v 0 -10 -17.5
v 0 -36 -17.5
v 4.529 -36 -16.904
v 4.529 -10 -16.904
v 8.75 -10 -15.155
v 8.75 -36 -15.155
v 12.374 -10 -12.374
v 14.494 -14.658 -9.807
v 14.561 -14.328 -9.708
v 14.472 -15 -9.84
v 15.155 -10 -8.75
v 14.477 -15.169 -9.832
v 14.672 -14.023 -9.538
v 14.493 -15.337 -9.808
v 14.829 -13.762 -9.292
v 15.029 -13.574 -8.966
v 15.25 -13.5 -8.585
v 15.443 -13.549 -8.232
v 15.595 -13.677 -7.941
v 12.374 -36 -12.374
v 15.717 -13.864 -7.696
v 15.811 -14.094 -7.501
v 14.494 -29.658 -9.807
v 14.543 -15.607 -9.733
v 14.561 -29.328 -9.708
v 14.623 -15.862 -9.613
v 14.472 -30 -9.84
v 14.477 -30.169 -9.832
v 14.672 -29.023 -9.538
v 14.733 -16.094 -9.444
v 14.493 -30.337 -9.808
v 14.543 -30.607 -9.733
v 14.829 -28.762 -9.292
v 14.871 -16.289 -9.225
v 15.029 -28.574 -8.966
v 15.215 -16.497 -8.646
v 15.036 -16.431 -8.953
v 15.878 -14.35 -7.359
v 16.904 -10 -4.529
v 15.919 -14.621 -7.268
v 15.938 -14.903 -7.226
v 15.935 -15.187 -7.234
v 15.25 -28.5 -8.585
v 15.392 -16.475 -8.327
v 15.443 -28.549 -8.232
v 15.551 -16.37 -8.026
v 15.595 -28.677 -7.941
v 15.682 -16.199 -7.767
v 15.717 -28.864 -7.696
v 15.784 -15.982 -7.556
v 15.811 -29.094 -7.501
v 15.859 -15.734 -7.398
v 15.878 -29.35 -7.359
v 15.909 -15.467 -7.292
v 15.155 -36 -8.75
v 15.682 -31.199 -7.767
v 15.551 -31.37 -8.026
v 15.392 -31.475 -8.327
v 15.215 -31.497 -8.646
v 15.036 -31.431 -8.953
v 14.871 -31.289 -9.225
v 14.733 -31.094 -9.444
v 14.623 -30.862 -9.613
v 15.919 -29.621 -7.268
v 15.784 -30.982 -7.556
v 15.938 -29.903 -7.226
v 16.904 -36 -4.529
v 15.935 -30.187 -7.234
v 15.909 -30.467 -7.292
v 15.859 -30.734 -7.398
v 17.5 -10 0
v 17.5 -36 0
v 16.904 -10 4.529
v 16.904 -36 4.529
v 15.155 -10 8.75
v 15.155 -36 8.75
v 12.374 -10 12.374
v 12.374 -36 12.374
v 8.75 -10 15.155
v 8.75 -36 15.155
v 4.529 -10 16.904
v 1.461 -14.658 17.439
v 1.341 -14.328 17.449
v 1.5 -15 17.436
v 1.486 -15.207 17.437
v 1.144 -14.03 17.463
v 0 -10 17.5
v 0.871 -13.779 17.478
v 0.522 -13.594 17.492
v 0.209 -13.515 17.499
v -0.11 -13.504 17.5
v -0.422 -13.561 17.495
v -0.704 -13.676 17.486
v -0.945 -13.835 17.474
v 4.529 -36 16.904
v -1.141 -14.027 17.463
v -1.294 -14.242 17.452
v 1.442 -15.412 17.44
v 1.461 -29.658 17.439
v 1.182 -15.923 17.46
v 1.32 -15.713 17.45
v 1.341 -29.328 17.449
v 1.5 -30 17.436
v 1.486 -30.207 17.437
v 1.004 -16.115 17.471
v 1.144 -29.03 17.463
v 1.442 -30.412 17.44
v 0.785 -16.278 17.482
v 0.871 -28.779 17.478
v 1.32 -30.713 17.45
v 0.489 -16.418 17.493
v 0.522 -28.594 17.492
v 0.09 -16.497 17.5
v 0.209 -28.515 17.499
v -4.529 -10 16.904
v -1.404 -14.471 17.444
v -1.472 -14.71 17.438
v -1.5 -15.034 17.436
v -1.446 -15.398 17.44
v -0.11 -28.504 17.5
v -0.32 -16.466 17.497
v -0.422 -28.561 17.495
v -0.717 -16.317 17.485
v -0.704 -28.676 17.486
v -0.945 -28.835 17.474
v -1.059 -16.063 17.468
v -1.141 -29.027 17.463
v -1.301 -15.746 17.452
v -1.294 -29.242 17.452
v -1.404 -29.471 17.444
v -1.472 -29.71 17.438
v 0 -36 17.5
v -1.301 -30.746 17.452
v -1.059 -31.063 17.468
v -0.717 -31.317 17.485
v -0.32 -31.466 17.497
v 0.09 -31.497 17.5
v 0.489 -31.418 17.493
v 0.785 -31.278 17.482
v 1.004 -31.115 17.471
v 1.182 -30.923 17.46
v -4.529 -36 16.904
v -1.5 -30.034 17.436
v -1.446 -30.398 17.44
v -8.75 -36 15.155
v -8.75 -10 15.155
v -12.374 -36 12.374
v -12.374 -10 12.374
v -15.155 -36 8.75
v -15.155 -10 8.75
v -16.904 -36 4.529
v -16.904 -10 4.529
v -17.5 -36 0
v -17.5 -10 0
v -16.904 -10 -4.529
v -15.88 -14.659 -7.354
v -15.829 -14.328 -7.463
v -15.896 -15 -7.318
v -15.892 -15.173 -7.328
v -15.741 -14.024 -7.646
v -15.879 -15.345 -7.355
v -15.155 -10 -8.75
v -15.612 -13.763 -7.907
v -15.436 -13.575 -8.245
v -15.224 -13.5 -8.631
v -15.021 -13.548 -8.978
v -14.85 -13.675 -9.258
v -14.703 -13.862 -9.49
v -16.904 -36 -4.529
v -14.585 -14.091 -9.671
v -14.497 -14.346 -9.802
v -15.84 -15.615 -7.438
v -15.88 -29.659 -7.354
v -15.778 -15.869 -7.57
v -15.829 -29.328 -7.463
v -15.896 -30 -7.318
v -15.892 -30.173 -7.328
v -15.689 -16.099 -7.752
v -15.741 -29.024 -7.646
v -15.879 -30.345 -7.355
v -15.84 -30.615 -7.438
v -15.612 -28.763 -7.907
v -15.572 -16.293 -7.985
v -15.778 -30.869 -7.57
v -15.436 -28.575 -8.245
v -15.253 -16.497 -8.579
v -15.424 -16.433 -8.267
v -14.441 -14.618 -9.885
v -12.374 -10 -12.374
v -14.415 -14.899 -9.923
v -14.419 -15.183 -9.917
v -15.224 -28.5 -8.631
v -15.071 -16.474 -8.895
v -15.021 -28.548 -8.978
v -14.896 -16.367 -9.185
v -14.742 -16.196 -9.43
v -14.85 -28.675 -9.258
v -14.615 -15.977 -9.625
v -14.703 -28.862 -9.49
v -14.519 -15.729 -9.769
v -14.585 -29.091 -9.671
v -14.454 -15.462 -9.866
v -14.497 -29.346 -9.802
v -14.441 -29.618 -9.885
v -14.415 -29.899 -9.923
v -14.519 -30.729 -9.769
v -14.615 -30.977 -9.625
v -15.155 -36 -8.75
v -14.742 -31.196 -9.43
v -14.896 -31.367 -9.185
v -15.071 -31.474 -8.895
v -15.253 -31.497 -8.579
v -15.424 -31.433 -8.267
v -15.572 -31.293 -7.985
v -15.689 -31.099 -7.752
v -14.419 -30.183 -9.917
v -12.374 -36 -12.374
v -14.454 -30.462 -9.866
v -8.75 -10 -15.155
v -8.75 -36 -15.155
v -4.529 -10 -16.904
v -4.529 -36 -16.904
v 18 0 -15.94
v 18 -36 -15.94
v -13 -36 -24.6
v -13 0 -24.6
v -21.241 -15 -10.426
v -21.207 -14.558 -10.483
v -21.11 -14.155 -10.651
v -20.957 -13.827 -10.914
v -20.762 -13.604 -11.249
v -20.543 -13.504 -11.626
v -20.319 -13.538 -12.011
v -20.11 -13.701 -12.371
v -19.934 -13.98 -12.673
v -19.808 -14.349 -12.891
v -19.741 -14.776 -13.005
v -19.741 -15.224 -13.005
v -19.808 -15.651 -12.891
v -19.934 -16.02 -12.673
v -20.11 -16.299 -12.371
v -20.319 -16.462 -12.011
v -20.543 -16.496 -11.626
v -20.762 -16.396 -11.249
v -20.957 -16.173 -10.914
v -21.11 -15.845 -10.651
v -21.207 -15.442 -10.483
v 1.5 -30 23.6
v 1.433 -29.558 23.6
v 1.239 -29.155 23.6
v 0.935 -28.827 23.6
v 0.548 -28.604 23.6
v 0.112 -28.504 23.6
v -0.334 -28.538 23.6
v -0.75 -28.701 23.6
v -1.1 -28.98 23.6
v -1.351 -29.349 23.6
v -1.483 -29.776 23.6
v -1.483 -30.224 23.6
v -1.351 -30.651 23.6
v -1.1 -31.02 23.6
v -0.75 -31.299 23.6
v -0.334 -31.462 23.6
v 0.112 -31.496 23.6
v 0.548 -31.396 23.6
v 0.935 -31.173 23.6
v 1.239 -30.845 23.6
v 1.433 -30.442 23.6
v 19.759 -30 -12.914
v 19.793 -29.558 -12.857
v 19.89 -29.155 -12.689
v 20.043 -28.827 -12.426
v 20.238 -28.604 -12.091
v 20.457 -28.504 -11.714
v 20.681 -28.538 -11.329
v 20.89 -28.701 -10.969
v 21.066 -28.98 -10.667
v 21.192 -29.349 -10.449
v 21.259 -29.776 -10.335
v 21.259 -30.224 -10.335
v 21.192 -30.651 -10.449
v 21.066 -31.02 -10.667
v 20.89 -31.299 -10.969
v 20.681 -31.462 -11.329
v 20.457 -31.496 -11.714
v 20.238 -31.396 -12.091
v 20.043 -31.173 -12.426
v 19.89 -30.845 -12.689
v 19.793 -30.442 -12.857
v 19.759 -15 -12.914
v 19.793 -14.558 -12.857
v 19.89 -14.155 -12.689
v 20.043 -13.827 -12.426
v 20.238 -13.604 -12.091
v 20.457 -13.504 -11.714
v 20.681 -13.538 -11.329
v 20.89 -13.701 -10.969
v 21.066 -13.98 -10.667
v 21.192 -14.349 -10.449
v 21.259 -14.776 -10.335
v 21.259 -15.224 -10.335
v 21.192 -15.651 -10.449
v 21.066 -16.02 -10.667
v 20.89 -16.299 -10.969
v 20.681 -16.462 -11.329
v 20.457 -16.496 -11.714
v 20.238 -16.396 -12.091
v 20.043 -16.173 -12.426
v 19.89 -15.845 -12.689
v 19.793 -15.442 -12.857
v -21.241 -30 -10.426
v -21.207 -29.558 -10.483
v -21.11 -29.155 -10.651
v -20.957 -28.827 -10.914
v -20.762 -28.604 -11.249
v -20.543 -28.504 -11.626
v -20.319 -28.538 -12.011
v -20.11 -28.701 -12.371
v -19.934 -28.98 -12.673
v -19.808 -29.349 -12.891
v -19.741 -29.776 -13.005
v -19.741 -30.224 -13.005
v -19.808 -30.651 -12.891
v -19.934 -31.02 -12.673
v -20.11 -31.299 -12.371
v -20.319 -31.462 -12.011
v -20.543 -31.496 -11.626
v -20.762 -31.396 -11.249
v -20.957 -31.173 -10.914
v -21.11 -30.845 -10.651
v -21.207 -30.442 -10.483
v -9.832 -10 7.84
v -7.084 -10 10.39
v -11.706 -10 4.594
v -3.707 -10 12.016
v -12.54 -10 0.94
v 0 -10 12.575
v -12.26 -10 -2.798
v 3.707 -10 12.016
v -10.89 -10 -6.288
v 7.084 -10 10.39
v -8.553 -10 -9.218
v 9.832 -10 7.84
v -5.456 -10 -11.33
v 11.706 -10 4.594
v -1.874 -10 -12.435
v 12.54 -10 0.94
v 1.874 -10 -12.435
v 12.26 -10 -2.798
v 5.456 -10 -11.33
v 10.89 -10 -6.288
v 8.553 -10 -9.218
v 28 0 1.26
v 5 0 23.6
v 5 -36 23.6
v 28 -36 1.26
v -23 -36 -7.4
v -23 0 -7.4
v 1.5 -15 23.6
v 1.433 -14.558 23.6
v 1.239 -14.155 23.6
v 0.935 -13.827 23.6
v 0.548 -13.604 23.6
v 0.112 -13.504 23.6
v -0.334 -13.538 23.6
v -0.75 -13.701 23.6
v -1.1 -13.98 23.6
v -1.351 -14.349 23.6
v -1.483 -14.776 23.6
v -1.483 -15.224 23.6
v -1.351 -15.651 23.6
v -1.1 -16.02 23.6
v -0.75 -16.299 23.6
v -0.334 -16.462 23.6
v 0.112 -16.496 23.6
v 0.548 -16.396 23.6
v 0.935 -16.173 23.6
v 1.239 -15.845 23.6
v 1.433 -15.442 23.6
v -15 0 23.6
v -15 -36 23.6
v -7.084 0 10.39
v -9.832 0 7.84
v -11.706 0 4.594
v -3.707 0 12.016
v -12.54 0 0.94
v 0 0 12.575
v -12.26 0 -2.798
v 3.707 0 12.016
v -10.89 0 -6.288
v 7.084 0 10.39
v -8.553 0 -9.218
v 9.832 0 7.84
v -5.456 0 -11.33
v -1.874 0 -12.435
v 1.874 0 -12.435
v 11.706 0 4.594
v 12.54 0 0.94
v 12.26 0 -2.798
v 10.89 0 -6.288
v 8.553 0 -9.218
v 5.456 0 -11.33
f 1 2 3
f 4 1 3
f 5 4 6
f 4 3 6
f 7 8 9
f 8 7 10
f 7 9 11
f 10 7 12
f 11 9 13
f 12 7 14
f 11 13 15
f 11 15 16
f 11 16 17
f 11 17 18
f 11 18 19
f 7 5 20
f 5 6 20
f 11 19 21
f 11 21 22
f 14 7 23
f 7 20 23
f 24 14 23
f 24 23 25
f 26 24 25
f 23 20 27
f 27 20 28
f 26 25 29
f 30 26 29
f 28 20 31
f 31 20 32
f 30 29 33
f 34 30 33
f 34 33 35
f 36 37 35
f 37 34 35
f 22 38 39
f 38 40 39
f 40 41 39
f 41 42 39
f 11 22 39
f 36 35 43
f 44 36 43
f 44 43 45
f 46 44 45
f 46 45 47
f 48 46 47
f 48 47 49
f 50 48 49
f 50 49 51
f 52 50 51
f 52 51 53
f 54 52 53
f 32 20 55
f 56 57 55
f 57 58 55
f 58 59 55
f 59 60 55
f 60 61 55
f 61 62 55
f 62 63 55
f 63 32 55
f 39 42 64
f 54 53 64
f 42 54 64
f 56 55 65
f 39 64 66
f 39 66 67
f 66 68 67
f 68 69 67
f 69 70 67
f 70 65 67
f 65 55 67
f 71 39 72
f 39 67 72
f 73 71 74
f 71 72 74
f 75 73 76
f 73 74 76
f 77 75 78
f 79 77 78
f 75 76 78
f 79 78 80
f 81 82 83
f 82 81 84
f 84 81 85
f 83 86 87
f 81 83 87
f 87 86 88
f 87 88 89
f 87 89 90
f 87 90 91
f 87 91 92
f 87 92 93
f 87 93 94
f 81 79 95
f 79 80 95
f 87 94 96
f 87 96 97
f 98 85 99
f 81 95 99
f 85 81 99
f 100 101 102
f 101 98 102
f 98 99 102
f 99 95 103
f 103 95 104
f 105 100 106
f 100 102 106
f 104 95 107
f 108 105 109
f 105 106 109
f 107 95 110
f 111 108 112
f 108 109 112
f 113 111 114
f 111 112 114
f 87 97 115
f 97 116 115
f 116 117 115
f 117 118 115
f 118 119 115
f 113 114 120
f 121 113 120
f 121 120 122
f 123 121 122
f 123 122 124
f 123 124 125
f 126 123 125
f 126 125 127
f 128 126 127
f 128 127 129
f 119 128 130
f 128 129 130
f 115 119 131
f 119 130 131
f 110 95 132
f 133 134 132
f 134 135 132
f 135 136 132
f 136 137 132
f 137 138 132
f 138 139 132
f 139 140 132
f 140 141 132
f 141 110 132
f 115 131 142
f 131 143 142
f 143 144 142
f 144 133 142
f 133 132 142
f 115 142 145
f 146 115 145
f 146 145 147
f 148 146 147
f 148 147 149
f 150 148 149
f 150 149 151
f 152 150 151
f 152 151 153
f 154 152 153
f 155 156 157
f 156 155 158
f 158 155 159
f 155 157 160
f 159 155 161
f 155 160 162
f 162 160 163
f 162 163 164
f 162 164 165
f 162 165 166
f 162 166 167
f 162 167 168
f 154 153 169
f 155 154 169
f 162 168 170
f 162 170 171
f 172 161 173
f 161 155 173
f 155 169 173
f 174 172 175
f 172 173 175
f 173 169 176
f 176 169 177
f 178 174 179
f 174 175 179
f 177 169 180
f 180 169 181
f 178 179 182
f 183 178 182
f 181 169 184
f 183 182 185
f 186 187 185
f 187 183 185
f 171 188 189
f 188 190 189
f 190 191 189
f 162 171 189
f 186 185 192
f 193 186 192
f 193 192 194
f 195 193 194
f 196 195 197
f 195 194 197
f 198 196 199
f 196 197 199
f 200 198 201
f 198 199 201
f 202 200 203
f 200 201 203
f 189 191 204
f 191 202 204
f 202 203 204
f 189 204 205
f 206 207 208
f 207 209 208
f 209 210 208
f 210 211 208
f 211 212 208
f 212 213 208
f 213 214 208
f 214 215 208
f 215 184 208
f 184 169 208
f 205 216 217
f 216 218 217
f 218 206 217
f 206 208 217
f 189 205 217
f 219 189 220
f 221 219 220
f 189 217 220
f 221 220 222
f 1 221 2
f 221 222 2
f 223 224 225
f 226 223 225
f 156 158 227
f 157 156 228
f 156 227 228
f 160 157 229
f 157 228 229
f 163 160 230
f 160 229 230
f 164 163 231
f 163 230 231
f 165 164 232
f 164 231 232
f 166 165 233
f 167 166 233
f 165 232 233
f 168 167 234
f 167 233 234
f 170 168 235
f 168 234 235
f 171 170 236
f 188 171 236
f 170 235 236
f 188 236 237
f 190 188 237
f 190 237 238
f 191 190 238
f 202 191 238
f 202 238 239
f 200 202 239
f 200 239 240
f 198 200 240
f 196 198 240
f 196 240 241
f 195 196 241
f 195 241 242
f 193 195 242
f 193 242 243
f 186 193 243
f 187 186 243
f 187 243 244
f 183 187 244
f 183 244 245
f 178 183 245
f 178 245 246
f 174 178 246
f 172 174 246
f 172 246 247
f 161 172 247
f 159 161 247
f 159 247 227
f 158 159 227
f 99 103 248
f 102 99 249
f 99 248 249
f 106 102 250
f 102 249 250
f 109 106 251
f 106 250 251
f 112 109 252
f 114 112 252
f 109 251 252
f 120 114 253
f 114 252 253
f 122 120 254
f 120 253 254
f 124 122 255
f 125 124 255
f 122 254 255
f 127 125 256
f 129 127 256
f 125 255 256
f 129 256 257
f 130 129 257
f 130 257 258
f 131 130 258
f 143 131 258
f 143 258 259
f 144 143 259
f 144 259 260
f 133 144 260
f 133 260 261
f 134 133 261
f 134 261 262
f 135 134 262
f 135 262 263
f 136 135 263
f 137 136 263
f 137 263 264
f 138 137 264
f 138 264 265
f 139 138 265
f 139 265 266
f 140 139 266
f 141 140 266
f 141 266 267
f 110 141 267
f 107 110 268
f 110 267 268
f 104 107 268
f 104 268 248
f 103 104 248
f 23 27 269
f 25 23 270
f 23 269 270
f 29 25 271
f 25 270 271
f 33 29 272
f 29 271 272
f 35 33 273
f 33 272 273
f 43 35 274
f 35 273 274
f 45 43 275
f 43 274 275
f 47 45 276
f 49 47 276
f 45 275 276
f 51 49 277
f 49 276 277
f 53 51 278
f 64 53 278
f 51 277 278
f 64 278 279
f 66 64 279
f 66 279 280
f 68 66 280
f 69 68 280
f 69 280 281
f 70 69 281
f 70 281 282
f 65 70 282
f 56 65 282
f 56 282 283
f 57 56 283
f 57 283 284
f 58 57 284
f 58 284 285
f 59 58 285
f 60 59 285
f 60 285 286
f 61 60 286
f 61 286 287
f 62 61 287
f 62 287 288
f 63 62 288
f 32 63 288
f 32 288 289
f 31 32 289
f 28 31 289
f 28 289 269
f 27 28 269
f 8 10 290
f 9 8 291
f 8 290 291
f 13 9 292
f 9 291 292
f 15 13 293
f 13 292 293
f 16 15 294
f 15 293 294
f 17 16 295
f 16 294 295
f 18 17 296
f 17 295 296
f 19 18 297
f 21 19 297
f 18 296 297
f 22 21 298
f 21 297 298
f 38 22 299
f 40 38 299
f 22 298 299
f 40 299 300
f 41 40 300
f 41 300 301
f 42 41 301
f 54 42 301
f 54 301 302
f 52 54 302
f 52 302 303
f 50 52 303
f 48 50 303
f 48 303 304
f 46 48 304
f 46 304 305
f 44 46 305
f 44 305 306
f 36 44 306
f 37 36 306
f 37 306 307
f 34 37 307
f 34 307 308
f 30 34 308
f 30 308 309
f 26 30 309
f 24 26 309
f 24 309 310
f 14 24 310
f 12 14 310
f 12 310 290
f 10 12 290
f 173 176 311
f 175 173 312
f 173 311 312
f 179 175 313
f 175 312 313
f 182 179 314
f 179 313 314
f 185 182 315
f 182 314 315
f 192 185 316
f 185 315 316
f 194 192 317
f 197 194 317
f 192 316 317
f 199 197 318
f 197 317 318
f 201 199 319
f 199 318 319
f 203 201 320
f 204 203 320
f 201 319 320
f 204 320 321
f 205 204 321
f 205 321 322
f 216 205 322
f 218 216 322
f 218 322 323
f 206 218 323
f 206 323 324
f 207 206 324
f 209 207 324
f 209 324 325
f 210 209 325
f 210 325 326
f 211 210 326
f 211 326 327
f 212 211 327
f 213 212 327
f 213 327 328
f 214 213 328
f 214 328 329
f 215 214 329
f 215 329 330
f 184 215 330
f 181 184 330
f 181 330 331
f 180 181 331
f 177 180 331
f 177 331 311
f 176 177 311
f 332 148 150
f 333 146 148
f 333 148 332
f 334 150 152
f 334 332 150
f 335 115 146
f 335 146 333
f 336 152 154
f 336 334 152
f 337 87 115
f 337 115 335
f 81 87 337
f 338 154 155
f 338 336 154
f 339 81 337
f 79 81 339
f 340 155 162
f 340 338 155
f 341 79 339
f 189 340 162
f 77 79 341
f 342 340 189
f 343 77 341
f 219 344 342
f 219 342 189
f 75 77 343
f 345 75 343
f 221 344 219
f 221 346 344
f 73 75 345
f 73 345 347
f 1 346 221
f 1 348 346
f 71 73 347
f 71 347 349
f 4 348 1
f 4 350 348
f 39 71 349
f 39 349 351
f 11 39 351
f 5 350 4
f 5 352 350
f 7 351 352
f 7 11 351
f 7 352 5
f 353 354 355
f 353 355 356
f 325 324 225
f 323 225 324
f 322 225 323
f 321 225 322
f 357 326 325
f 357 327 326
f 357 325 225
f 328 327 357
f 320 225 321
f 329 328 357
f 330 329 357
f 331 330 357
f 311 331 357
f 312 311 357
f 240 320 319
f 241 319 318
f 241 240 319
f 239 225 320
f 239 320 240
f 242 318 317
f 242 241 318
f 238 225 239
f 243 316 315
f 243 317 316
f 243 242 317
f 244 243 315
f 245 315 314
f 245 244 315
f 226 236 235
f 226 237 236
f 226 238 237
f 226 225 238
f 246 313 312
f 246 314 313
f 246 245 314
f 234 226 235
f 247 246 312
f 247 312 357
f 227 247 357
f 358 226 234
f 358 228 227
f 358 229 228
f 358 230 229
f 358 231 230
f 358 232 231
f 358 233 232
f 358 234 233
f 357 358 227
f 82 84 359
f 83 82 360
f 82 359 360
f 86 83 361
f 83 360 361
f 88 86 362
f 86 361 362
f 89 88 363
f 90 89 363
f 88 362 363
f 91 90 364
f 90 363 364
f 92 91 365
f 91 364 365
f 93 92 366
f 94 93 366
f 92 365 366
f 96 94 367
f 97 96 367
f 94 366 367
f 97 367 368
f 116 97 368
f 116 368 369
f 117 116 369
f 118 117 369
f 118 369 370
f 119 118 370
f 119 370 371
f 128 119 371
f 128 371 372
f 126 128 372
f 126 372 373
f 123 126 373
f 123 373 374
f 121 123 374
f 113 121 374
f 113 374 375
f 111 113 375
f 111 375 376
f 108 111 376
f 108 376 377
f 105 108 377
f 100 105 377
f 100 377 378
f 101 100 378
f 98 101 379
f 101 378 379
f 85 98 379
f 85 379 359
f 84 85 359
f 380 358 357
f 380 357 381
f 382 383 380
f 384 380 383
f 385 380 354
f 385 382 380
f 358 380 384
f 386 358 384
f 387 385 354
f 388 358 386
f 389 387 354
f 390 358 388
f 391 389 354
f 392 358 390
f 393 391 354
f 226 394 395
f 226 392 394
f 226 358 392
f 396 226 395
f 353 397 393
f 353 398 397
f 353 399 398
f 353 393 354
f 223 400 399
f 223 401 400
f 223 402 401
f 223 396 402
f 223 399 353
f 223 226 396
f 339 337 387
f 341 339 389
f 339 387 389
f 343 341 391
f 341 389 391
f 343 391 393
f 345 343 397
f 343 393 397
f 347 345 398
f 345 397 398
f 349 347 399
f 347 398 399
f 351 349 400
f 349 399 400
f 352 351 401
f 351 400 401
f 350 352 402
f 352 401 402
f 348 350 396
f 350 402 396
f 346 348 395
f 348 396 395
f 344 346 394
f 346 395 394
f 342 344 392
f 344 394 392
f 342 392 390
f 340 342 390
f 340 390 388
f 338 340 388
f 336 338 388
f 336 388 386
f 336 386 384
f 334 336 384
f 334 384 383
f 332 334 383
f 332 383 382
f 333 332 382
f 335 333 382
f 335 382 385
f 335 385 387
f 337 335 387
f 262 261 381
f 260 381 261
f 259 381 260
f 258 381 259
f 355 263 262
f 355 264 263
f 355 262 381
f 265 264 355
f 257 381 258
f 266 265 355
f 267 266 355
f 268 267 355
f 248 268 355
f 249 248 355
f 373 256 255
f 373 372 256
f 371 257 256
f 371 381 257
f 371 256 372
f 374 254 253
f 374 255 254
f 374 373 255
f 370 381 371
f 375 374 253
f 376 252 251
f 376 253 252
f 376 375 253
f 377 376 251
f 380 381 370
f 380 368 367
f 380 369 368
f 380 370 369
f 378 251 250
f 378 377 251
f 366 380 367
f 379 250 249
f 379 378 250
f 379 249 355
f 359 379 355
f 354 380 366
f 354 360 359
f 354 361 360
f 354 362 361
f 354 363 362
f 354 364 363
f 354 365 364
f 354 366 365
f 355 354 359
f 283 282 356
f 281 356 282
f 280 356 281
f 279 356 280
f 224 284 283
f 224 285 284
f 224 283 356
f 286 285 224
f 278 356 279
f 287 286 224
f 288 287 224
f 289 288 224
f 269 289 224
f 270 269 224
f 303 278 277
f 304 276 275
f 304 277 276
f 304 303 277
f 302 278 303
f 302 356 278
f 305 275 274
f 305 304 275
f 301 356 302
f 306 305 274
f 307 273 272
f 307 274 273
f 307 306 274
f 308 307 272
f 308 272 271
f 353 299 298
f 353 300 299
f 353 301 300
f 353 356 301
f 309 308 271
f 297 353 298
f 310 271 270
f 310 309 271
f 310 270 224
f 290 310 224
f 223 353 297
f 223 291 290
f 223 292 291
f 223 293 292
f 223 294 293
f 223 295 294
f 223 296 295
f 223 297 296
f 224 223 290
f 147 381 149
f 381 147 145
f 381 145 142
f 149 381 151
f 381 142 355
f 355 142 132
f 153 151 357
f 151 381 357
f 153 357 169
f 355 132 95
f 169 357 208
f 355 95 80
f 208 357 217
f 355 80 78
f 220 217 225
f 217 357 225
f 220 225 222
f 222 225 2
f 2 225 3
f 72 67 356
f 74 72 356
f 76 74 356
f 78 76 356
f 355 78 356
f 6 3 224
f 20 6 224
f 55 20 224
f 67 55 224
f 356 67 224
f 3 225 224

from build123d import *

# Parameters (mm, degrees)
SKETCH2_R               = 12.575
BOSS_EXTRUDE1_DEPTH     = 36
SKETCH3_R               = 17.5
CUT_EXTRUDE1_DEPTH      = 26
CUT_EXTRUDE2_REACH      = 68.591
CUT_EXTRUDE2_END_RADIUS = 17.5
SKETCH4_R               = 1.5
CUT_EXTRUDE5_REACH      = 71.976
CUT_EXTRUDE5_END_RADIUS = 17.5
SKETCH7_R               = 1.5
CUT_EXTRUDE6_REACH      = 68.357
CUT_EXTRUDE6_END_RADIUS = 17.5
SKETCH8_R               = 1.5


with BuildPart() as part:
    # Sketch2 → Boss-Extrude1 (new body)
    with BuildSketch(Plane(origin=(0, 0, 0), x_dir=(1, 0, 0), z_dir=(0, 1, 0))):
        Polygon((-23, 7.4), (-15, -23.6), (5, -23.6), (28, -1.26), (18, 15.94), (-13, 24.6), align=None)
        with Locations(Location((0, 0, 0), (0, 0, 270))):
            Circle(SKETCH2_R, mode=Mode.SUBTRACT)
    extrude(amount=-BOSS_EXTRUDE1_DEPTH)

    # Sketch3 → Cut-Extrude1 (cut)
    with BuildSketch(Plane.XZ.offset(36)):
        with Locations(Location((0, 0, 0), (0, 0, 270))):
            Circle(SKETCH3_R)
    extrude(amount=-CUT_EXTRUDE1_DEPTH, mode=Mode.SUBTRACT)

    # Cut-Extrude2: up to this cylinder (the profile starts outside it)
    cut_extrude2_end = Plane(origin=(0, -22.5, 0), z_dir=(0, -1, 0)) * Cylinder(CUT_EXTRUDE2_END_RADIUS, 188.182, mode=Mode.PRIVATE)
    # Sketch4 → Cut-Extrude2 (cut, up to the surface)
    with BuildSketch(Plane(origin=(20.378940986, 0, -11.848221504), x_dir=(-0.5026204573745311, 0, -0.8645071866841925), z_dir=(0.8645071866841925, 0, -0.5026204573745311)), mode=Mode.PRIVATE) as cut_extrude2_sk1:
        with Locations((-0.266923677, -15)):
            Circle(SKETCH4_R)
    cut_extrude2_tool1 = extrude(cut_extrude2_sk1.sketch, amount=-CUT_EXTRUDE2_REACH, mode=Mode.PRIVATE) - cut_extrude2_end
    add(cut_extrude2_tool1.solids().sort_by_distance((20.513102, -15, -11.617464))[0], mode=Mode.SUBTRACT)
    # Sketch4 → Cut-Extrude2 (cut, up to the surface)
    with BuildSketch(Plane(origin=(20.378940986, 0, -11.848221504), x_dir=(-0.5026204573745311, 0, -0.8645071866841925), z_dir=(0.8645071866841925, 0, -0.5026204573745311)), mode=Mode.PRIVATE) as cut_extrude2_sk2:
        with Locations((-0.266923677, -30)):
            Circle(SKETCH4_R)
    cut_extrude2_tool2 = extrude(cut_extrude2_sk2.sketch, amount=-CUT_EXTRUDE2_REACH, mode=Mode.PRIVATE) - cut_extrude2_end
    add(cut_extrude2_tool2.solids().sort_by_distance((20.513102, -30, -11.617464))[0], mode=Mode.SUBTRACT)

    # Cut-Extrude5: up to this cylinder (the profile starts outside it)
    cut_extrude5_end = Plane(origin=(0, -22.5, 0), z_dir=(0, -1, 0)) * Cylinder(CUT_EXTRUDE5_END_RADIUS, 194.952, mode=Mode.PRIVATE)
    # Sketch7 → Cut-Extrude5 (cut, up to the surface)
    with BuildSketch(Plane(origin=(-20.405012126, 0, -11.863379143), x_dir=(-0.5026204573745304, 0, 0.8645071866841929), z_dir=(-0.8645071866841929, 0, -0.5026204573745304)), mode=Mode.PRIVATE) as cut_extrude5_sk1:
        with Locations((0.162917338, -30)):
            Circle(SKETCH7_R)
    cut_extrude5_tool1 = extrude(cut_extrude5_sk1.sketch, amount=-CUT_EXTRUDE5_REACH, mode=Mode.PRIVATE) - cut_extrude5_end
    add(cut_extrude5_tool1.solids().sort_by_distance((-20.486898, -30, -11.722536))[0], mode=Mode.SUBTRACT)
    # Sketch7 → Cut-Extrude5 (cut, up to the surface)
    with BuildSketch(Plane(origin=(-20.405012126, 0, -11.863379143), x_dir=(-0.5026204573745304, 0, 0.8645071866841929), z_dir=(-0.8645071866841929, 0, -0.5026204573745304)), mode=Mode.PRIVATE) as cut_extrude5_sk2:
        with Locations((0.162917338, -15)):
            Circle(SKETCH7_R)
    cut_extrude5_tool2 = extrude(cut_extrude5_sk2.sketch, amount=-CUT_EXTRUDE5_REACH, mode=Mode.PRIVATE) - cut_extrude5_end
    add(cut_extrude5_tool2.solids().sort_by_distance((-20.486898, -15, -11.722536))[0], mode=Mode.SUBTRACT)

    # Cut-Extrude6: up to this cylinder (the profile starts outside it)
    cut_extrude6_end = Plane(origin=(0, -22.5, 0), z_dir=(0, -1, 0)) * Cylinder(CUT_EXTRUDE6_END_RADIUS, 187.714, mode=Mode.PRIVATE)
    # Sketch8 → Cut-Extrude6 (cut, up to the surface)
    with BuildSketch(Plane.XY.offset(23.6), mode=Mode.PRIVATE) as cut_extrude6_sk1:
        with Locations((0, -30)):
            Circle(SKETCH8_R)
    cut_extrude6_tool1 = extrude(cut_extrude6_sk1.sketch, amount=-CUT_EXTRUDE6_REACH, mode=Mode.PRIVATE) - cut_extrude6_end
    add(cut_extrude6_tool1.solids().sort_by_distance((0, -30, 23.6))[0], mode=Mode.SUBTRACT)
    # Sketch8 → Cut-Extrude6 (cut, up to the surface)
    with BuildSketch(Plane.XY.offset(23.6), mode=Mode.PRIVATE) as cut_extrude6_sk2:
        with Locations((0, -15)):
            Circle(SKETCH8_R)
    cut_extrude6_tool2 = extrude(cut_extrude6_sk2.sketch, amount=-CUT_EXTRUDE6_REACH, mode=Mode.PRIVATE) - cut_extrude6_end
    add(cut_extrude6_tool2.solids().sort_by_distance((0, -15, 23.6))[0], mode=Mode.SUBTRACT)


solid = part.part
